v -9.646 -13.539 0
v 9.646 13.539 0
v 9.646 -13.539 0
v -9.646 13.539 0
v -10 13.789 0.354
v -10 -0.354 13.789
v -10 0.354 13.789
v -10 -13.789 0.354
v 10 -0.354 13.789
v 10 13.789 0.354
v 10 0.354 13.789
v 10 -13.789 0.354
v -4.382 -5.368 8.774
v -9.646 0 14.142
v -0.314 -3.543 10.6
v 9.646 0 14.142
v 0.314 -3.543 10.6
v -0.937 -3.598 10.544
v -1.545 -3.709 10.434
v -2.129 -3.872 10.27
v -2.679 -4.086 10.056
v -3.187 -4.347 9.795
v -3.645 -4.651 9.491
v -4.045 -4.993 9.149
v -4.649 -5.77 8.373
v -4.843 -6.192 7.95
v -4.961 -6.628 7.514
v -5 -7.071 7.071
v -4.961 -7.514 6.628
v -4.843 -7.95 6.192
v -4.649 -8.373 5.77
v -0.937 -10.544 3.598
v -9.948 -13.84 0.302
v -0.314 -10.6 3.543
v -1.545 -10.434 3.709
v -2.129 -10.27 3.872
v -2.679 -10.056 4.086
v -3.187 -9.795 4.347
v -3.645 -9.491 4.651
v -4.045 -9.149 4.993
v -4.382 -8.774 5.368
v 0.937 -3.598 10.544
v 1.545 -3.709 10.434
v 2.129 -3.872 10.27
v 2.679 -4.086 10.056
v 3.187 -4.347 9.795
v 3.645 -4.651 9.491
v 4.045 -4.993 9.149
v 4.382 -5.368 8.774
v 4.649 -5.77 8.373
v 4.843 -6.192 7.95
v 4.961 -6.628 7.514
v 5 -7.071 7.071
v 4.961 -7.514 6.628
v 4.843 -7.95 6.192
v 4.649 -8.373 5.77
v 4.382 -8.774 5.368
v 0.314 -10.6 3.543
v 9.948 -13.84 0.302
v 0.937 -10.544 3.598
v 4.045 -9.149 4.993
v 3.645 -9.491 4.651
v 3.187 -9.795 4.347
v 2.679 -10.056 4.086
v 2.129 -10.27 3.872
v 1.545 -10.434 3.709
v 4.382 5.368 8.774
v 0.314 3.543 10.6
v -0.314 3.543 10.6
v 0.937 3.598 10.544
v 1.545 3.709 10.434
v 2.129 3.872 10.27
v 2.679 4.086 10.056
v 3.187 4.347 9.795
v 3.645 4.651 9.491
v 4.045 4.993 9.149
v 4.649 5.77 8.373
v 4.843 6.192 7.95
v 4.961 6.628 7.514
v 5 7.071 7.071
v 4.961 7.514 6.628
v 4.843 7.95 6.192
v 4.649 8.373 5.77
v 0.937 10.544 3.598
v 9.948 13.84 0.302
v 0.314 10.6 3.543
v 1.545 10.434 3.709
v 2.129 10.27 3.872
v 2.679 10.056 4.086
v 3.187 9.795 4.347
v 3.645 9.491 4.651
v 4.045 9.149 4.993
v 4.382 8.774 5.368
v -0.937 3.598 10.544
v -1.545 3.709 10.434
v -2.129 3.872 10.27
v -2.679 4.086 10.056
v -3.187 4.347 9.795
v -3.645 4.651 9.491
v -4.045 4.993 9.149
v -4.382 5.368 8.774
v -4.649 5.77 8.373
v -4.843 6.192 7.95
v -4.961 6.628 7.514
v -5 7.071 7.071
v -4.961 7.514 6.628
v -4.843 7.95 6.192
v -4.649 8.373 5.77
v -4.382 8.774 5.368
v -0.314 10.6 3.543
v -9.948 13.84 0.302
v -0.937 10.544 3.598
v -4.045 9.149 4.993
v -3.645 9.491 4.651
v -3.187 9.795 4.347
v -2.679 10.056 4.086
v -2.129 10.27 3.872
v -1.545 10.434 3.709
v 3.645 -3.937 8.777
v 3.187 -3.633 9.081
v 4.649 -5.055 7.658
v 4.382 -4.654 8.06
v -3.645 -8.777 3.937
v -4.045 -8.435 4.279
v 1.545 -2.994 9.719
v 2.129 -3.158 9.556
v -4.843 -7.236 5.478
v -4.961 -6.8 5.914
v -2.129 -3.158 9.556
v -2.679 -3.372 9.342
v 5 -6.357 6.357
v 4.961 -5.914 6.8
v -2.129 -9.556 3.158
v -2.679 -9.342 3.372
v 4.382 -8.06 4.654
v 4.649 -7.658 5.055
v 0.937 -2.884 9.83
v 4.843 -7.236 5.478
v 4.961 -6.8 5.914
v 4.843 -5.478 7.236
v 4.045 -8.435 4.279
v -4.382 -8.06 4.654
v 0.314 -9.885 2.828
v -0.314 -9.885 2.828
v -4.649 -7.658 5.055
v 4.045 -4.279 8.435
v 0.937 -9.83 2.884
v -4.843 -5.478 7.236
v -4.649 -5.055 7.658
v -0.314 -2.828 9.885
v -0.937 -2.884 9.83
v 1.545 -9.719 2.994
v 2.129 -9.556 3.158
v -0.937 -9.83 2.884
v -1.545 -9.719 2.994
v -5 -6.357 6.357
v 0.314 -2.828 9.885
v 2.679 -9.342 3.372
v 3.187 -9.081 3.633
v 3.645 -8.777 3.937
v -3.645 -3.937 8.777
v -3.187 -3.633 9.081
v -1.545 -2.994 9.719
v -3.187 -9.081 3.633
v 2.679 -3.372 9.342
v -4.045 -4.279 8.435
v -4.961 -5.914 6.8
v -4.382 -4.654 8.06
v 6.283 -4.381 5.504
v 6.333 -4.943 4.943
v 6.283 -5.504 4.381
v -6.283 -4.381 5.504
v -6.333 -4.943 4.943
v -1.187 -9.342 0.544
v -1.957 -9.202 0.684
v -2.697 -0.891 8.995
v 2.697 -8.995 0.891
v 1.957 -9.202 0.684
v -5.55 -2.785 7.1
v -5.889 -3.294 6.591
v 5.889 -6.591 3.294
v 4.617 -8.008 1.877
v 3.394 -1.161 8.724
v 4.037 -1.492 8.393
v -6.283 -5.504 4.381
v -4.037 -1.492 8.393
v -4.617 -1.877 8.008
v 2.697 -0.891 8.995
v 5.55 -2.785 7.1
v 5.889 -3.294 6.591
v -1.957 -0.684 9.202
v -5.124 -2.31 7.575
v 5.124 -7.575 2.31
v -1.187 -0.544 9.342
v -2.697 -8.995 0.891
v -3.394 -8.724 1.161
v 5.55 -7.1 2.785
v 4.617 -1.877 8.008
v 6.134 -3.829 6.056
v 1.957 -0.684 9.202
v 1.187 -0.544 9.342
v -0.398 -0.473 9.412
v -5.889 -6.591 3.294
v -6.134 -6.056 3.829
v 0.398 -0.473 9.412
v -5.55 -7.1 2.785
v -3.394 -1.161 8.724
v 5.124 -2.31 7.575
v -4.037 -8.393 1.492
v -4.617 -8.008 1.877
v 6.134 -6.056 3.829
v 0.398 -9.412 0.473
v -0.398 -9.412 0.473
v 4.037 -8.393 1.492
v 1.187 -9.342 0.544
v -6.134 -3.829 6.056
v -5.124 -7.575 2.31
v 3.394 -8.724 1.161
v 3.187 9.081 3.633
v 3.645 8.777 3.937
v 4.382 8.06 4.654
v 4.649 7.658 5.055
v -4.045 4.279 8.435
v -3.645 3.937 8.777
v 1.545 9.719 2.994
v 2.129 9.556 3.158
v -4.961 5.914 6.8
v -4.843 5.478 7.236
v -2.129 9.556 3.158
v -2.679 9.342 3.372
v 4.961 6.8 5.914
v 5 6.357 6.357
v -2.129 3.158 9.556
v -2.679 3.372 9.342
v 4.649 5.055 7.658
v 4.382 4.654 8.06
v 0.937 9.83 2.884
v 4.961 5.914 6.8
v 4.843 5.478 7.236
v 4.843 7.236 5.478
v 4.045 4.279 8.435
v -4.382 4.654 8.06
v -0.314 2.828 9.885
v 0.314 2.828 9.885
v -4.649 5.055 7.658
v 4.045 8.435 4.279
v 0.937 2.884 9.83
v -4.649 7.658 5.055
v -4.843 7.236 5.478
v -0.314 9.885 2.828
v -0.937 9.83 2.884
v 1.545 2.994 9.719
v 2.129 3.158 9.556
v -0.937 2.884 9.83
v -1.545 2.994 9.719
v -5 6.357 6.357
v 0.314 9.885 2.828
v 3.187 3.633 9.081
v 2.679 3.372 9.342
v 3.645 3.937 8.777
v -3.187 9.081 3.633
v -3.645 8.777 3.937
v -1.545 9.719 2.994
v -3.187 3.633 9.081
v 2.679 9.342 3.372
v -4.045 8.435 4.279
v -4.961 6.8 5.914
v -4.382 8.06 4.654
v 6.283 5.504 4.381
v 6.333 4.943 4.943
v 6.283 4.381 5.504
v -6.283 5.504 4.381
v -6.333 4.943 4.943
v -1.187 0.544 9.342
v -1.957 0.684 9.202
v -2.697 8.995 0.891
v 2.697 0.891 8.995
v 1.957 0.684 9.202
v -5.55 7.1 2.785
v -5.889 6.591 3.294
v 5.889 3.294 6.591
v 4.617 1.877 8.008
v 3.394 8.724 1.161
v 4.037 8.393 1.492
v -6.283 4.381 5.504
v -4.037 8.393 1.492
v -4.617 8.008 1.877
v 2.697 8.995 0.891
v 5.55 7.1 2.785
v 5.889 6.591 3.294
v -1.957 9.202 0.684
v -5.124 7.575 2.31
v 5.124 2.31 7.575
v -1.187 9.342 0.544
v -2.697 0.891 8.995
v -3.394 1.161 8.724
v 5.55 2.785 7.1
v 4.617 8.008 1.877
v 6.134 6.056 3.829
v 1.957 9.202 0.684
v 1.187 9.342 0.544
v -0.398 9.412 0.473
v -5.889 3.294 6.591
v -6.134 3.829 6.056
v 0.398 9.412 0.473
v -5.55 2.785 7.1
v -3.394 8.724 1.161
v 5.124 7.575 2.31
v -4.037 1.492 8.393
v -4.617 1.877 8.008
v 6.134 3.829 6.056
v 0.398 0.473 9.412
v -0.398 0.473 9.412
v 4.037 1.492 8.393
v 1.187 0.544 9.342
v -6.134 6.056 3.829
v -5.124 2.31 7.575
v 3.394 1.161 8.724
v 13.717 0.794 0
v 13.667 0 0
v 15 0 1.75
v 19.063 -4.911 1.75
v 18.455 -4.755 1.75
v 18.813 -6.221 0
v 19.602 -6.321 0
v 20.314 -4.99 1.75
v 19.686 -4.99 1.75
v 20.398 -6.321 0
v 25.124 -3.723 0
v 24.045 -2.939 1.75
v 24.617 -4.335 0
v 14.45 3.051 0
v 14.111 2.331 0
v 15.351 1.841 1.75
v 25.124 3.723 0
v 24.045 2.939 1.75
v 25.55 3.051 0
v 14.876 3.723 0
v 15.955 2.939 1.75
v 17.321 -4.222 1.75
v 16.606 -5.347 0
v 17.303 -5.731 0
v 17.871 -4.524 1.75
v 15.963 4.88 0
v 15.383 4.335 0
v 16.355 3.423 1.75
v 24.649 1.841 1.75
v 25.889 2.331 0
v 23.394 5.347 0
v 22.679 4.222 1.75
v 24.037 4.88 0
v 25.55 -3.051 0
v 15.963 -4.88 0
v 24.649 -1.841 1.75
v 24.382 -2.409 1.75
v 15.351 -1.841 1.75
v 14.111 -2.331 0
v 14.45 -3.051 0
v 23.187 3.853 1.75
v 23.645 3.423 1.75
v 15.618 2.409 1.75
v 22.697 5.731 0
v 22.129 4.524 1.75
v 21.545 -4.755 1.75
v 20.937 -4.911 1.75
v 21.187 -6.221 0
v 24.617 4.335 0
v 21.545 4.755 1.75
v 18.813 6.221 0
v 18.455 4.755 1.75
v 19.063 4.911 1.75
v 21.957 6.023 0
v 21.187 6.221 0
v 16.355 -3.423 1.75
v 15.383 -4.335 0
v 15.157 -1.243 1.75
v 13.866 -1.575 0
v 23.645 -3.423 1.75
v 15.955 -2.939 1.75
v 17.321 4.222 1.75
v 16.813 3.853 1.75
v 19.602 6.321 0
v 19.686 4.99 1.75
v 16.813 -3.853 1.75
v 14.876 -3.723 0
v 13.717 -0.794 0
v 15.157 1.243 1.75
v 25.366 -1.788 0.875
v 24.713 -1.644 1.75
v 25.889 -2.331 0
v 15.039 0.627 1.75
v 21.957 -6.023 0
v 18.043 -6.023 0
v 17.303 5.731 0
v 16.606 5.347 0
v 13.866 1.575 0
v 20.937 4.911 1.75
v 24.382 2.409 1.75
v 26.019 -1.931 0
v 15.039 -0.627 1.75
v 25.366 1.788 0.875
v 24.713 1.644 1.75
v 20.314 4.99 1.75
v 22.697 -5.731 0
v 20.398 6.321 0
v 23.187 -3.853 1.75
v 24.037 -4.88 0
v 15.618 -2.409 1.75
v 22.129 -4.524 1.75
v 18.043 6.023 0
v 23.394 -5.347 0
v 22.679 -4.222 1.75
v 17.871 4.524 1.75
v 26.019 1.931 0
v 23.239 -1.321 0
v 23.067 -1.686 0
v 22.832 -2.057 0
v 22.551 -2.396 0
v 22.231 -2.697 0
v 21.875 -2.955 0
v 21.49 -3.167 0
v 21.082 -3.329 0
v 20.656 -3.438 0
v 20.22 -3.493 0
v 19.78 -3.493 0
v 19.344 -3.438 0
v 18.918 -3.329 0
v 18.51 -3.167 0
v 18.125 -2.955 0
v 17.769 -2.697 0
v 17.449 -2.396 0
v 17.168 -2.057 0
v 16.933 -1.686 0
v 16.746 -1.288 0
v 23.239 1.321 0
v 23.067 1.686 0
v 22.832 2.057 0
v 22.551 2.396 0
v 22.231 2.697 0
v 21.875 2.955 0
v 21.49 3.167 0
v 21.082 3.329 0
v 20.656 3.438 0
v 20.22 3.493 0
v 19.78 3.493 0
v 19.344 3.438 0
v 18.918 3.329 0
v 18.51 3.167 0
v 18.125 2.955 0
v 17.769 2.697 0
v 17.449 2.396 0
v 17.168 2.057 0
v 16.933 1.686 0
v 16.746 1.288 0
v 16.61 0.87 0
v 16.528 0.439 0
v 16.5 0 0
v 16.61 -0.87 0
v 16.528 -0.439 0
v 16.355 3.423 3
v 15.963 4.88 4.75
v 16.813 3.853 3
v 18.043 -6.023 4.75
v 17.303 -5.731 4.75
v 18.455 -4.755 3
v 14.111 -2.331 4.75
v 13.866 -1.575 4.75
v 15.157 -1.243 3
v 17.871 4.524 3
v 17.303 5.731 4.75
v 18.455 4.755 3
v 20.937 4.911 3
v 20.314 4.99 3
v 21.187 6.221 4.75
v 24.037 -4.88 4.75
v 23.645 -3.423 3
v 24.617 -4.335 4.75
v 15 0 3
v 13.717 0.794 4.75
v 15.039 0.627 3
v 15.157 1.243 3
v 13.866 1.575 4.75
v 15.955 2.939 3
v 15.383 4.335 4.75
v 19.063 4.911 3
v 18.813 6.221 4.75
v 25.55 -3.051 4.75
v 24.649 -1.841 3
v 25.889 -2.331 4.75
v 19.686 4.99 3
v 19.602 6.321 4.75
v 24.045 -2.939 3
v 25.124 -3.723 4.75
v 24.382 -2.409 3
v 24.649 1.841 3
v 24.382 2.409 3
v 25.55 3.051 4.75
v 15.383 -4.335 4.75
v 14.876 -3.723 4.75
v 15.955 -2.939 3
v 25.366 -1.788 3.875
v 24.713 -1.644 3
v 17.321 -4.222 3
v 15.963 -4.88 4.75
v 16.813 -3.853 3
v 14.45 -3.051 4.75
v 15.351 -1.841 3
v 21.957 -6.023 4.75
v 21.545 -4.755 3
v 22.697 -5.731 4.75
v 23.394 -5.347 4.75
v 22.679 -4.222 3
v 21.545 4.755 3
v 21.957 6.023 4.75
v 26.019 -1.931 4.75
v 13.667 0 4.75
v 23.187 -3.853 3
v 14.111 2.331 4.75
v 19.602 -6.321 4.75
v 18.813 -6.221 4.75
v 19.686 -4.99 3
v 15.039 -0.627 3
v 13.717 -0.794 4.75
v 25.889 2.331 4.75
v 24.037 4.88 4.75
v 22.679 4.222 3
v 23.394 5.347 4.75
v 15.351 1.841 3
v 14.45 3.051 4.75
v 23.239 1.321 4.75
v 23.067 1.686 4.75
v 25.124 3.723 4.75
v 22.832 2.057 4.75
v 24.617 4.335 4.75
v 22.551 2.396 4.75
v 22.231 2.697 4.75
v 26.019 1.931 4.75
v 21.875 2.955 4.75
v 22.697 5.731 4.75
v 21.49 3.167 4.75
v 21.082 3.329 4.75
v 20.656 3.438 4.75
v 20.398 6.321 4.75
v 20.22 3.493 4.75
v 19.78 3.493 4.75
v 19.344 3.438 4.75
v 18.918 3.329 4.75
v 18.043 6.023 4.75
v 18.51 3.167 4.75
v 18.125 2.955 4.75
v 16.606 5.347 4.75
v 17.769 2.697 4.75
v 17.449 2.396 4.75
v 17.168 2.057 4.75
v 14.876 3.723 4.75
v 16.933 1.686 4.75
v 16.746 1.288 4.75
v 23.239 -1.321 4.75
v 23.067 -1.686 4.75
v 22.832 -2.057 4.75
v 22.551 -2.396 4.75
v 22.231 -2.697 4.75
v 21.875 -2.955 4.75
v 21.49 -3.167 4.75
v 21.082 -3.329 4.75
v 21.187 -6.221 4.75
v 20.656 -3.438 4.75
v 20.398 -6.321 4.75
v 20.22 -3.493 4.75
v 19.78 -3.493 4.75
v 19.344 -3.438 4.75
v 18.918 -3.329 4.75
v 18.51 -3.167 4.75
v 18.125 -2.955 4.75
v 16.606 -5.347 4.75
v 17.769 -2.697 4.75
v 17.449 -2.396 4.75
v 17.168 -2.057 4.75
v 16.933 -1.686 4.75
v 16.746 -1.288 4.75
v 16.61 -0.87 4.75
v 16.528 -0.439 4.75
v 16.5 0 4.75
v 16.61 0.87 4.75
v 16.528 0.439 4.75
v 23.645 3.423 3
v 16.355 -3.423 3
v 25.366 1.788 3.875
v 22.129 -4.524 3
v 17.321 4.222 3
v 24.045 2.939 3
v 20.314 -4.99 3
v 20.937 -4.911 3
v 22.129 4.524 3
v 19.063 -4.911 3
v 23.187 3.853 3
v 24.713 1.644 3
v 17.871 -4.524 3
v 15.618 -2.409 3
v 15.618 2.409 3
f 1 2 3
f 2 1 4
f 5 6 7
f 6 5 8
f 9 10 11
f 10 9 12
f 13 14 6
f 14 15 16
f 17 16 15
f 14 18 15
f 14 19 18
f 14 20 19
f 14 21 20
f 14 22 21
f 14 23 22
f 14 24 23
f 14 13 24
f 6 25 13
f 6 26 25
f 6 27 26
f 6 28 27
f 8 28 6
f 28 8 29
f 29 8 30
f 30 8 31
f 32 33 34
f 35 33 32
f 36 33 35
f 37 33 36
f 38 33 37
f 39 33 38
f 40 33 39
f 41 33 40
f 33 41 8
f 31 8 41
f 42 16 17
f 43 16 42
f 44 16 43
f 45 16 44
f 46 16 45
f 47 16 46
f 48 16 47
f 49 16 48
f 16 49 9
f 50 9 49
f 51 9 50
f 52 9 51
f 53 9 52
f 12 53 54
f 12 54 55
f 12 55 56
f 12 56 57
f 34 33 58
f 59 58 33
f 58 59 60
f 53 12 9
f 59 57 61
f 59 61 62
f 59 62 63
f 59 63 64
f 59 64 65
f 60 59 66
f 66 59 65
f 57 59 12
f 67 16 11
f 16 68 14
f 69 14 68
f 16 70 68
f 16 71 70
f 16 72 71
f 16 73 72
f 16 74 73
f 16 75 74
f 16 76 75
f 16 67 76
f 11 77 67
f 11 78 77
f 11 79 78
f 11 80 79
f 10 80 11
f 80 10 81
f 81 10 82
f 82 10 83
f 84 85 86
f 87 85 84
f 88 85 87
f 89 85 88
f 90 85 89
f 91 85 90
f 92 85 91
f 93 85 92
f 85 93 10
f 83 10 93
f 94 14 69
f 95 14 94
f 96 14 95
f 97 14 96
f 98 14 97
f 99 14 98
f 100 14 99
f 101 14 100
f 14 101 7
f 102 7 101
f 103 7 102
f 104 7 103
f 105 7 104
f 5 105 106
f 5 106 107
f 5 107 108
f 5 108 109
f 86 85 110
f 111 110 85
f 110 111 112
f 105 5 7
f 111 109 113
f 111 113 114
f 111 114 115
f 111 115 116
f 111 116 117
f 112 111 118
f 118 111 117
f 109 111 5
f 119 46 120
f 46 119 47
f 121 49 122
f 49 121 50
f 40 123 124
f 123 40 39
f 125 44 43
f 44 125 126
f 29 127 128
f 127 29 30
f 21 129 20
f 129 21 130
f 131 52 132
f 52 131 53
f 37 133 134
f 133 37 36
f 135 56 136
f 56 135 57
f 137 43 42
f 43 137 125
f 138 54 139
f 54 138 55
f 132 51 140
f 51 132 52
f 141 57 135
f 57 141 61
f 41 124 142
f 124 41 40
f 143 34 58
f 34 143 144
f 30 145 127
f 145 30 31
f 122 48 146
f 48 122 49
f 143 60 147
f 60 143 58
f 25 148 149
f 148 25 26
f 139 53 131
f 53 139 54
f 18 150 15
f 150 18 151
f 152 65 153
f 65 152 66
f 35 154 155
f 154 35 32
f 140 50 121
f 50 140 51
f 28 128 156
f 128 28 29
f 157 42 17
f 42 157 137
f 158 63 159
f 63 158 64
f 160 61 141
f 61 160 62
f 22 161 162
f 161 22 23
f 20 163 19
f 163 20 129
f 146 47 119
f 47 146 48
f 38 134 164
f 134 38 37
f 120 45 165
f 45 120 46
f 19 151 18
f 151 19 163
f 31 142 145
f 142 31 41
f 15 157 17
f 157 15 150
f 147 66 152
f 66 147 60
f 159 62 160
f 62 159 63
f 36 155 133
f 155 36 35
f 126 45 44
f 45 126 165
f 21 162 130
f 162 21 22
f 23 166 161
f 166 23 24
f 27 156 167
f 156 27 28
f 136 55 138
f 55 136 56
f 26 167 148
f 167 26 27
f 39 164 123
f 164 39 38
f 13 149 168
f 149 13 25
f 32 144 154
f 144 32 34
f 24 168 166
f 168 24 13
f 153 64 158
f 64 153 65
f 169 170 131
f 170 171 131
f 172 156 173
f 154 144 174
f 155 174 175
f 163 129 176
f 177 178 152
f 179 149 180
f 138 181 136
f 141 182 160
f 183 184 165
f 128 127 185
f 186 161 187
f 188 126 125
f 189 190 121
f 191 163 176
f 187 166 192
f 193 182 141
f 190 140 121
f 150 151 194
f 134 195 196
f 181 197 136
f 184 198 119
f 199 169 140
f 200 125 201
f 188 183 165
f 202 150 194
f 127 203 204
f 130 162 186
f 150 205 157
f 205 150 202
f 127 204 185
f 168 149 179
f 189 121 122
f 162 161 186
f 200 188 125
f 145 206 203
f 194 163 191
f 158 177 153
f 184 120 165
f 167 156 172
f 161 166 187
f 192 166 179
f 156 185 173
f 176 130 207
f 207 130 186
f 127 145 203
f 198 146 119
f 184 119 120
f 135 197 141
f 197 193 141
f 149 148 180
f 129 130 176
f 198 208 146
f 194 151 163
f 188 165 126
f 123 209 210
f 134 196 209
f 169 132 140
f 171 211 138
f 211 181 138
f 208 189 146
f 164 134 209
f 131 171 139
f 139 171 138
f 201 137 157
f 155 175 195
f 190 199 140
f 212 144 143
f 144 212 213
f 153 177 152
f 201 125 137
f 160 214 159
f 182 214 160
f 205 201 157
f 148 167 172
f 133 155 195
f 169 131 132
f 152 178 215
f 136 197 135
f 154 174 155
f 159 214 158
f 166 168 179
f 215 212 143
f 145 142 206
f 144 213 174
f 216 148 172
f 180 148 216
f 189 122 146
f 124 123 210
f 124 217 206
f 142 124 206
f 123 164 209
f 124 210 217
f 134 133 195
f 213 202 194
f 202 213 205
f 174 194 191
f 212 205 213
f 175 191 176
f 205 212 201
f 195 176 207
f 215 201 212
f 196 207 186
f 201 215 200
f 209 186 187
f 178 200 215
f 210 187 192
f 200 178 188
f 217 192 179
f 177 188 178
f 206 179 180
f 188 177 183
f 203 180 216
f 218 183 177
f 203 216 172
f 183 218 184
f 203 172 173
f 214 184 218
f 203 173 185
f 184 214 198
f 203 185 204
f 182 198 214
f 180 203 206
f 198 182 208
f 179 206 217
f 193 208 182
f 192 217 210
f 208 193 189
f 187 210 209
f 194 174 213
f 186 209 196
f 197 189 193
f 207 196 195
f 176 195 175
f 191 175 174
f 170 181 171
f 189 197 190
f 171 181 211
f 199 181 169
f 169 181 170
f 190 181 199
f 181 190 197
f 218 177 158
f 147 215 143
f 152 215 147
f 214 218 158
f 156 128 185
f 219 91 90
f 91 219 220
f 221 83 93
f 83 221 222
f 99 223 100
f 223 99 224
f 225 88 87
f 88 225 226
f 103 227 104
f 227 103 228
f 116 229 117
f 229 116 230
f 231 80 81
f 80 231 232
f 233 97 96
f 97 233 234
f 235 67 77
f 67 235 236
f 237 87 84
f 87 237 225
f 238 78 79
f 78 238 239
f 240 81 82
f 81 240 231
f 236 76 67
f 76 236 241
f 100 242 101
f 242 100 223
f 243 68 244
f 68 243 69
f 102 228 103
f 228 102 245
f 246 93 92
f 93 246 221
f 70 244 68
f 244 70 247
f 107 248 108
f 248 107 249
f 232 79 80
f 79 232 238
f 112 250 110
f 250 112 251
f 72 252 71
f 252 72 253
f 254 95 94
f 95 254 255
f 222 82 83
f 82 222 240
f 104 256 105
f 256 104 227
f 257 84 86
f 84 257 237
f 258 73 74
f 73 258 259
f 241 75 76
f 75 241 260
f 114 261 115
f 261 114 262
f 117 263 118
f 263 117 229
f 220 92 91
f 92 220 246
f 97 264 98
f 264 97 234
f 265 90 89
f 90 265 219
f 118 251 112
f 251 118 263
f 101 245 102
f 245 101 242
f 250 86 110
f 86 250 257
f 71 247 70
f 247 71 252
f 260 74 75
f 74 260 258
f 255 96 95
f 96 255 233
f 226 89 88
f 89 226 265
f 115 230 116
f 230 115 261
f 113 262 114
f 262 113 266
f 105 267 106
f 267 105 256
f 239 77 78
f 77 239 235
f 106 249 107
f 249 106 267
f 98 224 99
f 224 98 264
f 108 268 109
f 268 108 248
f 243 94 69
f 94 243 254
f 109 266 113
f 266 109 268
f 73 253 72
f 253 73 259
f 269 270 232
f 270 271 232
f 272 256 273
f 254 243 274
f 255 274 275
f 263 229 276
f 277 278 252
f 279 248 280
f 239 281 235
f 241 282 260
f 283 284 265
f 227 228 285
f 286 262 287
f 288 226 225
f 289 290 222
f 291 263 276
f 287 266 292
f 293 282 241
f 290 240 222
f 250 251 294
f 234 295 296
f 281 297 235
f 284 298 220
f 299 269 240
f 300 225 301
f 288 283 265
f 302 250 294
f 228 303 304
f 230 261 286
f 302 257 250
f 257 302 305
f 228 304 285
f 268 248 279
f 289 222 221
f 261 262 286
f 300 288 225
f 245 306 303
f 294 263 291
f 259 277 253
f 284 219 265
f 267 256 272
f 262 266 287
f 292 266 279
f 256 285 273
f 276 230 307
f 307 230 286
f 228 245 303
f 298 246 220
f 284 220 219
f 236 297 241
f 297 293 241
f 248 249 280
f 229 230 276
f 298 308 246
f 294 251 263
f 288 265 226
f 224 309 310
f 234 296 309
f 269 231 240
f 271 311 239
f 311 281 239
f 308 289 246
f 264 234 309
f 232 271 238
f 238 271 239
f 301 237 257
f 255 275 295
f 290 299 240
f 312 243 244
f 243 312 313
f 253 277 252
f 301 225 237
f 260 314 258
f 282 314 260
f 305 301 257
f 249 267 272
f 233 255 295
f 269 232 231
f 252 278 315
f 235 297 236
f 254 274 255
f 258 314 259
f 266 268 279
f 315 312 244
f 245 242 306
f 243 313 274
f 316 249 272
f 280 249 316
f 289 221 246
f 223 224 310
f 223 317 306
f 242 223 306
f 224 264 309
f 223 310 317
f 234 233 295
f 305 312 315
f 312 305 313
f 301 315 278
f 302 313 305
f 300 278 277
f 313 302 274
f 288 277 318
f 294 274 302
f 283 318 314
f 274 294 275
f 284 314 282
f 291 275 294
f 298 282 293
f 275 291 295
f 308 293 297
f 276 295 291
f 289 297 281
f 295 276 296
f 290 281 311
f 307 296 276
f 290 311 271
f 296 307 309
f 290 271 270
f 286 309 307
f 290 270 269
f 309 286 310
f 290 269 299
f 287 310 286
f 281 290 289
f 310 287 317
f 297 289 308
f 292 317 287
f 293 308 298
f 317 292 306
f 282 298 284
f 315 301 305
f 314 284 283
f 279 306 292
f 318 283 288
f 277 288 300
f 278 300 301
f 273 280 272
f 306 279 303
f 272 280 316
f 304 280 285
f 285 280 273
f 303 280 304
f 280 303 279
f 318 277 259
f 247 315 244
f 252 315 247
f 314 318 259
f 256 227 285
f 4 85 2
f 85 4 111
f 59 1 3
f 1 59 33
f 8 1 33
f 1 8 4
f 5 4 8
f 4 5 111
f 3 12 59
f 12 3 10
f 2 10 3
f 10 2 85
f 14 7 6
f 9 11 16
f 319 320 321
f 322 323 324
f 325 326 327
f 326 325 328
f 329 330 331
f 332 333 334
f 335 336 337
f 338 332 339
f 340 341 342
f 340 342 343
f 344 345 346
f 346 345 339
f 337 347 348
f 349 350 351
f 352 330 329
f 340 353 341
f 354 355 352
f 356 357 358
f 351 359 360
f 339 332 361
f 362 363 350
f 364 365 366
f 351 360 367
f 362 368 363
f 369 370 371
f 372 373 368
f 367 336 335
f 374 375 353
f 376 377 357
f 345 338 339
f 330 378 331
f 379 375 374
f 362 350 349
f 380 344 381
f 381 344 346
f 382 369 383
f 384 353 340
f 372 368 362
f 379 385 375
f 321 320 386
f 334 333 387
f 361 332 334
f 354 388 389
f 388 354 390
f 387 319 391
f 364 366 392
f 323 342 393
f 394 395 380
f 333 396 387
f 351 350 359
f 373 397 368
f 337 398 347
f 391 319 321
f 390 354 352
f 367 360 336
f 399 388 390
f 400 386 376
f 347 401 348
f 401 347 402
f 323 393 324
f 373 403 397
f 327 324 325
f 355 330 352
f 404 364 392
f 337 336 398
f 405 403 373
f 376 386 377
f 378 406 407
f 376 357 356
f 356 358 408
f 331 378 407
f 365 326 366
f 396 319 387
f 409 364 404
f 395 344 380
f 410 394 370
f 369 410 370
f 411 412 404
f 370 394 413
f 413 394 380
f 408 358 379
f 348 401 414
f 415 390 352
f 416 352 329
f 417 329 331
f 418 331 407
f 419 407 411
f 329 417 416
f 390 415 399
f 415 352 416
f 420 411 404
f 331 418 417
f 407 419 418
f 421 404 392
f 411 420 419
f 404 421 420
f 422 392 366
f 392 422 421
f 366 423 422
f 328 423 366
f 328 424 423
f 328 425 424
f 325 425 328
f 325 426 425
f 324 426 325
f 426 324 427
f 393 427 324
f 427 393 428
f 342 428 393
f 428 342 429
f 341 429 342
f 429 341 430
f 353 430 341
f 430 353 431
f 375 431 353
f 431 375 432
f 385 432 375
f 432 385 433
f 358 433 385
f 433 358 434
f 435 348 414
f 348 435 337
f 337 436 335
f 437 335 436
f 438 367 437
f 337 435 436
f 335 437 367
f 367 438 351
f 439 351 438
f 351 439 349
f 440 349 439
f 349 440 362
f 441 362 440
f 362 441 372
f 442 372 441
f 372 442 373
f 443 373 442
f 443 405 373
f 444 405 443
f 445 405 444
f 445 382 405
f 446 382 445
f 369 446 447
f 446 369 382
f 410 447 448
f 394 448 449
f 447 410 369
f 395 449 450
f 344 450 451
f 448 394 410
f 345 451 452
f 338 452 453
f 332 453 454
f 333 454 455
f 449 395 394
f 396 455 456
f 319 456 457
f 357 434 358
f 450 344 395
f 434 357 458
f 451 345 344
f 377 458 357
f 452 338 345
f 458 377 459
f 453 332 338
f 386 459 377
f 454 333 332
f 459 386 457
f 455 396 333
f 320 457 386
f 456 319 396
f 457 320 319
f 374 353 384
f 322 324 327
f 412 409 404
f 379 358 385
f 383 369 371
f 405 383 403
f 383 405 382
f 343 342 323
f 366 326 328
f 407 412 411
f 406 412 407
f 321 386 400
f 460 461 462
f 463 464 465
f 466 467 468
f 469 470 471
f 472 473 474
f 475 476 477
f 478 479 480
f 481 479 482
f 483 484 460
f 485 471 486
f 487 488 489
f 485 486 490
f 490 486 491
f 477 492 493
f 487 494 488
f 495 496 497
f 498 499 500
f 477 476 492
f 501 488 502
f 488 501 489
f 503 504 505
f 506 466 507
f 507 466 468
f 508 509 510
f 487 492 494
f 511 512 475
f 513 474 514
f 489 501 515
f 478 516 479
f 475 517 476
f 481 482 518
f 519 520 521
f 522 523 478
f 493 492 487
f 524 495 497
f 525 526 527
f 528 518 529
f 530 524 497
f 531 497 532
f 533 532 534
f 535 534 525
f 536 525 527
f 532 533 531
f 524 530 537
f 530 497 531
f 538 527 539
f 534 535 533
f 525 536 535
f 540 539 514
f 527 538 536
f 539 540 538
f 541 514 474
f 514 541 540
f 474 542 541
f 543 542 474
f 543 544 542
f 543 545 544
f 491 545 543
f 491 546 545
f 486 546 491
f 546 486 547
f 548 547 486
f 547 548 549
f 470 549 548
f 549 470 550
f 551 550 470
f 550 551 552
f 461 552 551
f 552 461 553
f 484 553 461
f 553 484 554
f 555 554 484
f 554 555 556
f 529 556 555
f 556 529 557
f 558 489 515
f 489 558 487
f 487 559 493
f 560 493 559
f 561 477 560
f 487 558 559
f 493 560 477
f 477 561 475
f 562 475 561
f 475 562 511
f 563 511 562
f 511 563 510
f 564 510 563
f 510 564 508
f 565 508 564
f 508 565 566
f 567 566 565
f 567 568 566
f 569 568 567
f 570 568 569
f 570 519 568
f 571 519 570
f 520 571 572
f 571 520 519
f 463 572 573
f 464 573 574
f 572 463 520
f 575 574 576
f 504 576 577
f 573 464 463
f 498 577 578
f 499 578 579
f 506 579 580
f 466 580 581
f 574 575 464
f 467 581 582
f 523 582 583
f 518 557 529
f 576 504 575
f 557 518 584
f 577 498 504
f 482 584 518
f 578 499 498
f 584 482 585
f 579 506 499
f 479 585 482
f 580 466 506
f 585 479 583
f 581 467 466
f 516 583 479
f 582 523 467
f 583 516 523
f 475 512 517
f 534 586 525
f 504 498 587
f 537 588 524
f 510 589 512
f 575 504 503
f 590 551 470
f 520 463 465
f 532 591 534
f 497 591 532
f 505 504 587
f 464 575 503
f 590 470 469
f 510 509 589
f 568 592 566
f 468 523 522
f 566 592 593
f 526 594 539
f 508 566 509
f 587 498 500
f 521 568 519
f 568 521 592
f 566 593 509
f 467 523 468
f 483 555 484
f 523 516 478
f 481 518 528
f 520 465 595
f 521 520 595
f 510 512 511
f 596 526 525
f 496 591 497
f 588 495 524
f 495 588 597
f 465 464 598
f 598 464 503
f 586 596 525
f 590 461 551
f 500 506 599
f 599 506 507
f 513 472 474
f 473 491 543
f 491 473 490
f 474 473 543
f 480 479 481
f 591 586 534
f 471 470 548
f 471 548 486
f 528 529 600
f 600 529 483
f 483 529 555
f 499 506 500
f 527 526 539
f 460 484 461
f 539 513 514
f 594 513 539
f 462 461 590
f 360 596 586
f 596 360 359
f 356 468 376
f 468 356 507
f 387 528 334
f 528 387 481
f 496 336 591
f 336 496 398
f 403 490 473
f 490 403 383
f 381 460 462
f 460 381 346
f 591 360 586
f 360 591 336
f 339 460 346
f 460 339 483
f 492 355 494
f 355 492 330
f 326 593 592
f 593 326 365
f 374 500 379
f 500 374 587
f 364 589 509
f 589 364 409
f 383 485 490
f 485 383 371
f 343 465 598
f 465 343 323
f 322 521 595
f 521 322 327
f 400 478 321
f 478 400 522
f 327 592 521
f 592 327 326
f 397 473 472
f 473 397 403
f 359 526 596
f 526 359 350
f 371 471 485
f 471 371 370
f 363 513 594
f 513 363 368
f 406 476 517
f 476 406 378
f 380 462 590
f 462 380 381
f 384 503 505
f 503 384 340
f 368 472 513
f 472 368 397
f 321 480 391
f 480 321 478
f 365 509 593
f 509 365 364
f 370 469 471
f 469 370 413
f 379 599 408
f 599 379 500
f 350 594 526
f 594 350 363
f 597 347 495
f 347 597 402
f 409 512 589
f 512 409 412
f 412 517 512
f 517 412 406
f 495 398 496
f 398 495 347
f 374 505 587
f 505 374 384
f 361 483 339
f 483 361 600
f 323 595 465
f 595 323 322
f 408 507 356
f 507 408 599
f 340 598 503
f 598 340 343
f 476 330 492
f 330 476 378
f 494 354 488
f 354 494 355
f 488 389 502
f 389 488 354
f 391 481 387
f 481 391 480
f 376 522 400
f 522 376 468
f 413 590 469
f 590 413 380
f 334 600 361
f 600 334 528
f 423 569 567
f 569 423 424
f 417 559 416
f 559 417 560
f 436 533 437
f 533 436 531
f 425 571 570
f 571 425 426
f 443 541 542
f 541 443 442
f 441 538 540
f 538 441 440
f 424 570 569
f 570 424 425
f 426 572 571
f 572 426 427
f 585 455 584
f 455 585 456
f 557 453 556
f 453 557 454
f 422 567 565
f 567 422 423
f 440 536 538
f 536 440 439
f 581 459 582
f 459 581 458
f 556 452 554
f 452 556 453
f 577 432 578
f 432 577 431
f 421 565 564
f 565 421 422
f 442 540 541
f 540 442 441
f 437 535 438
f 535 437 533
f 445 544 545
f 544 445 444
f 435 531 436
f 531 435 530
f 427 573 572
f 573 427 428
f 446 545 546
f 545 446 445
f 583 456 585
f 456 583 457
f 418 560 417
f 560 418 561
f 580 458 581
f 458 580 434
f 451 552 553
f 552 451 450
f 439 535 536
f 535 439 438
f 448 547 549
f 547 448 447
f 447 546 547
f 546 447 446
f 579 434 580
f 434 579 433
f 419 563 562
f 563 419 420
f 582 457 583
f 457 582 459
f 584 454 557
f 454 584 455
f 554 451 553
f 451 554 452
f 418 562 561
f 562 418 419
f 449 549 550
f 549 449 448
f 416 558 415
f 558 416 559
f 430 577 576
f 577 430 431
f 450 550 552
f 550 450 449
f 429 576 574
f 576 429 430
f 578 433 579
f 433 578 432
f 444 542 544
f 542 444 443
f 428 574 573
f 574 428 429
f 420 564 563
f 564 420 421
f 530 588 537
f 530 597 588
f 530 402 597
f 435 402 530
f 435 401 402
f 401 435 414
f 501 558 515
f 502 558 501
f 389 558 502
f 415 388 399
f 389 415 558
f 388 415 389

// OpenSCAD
// Snake Puzzle
// Written by Marius Gheorghescu (@mgx3d)

// edge length in mm (15 .. 150mm)
size = 20;

/* [Hidden] */

// depth of the coupler (1.0 .. 3.0mm)
coupler_depth = min(5, size/10);
clip_ring_depth = coupler_depth/1.5;
connector_dia = size*0.95 - 6*clip_ring_depth - 1.0;

clearance = 0.25;
epsilon = 0.01;

$fn = 50;

debug = 0;



module prism(size)
{
    intersection() {
        translate([0,0, size])
            cube([size*2, size*2, size*2], center=true);
        
        rotate([45, 0, 0])
            cube([size, size, size], center=true);
    }
}


module piece()
{
    chamfer = 0.5;
    difference()
    {
        prism(size);

        if (0) {
            // save material ?
            translate([0,0,coupler_depth/2*0])
                difference() {
                    prism(size-2*coupler_depth);
                    cube([2*size, 2*size, 2*coupler_depth], center=true);
                }
        }
        
        
        rotate([45,0,0])
        translate([0,0,size - coupler_depth - epsilon]) {
            cylinder(r=connector_dia/2, h=size, center=true);
            translate([0,0, - size/2 + 0*coupler_depth/2])
                cylinder(r1=connector_dia/2 + clip_ring_depth, r2=connector_dia/2, h=coupler_depth, center=true);
        }

        rotate([-45,0,0])
        translate([0,0,size - coupler_depth - epsilon]) {
            cylinder(r=connector_dia/2, h=size, center=true);
            translate([0,0, - size/2 + 0*coupler_depth/2])
                cylinder(r1=connector_dia/2 + clip_ring_depth, r2=connector_dia/2, h=coupler_depth, center=true);            
        }
        
        //
        // chamfers
        //
        
        translate([0, size*sqrt(2)/2 - chamfer/2, 0])
        rotate([45,0,0])
            cube([2*size, chamfer, chamfer], center=true);

        translate([0, -size*sqrt(2)/2 + chamfer/2, 0])
        rotate([45,0,0])
            cube([2*size, chamfer, chamfer], center=true);

        translate([-size/2,0,0])
        rotate([45,0,90])
            cube([2*size, chamfer, chamfer], center=true);

        translate([size/2,0,0])
        rotate([45,0,90])
            cube([2*size, chamfer, chamfer], center=true);

        translate([-size/2,0,size*sqrt(2)/2])
        rotate([45,0,90])
            cube([2*size, chamfer, chamfer], center=true);

        translate([size/2,0,size*sqrt(2)/2])
        rotate([45,0,90])
            cube([2*size, chamfer, chamfer], center=true);

        if (debug)
            translate([0,0,-epsilon])
            cube([size,size,size]);
    }
}


module coupler()
{    
    wall_thickness = size/10;
    
    translate([0,0,coupler_depth*1.25 - clearance/2])
    difference() {
        union() {
            translate([0,0,-coupler_depth*0.75])
            cylinder(r1=connector_dia/2 + clip_ring_depth, r2=connector_dia/2, h=coupler_depth - clearance, center=true);
            
            translate([0,0,coupler_depth*0.75])
                cylinder(r2=connector_dia/2 + clip_ring_depth, r1=connector_dia/2, h=coupler_depth - clearance, center=true);
                        
            cylinder(r=connector_dia/2, h=2*coupler_depth, center=true);
        }
        
        // empty inside
        cylinder(r=connector_dia/2 - size/8 + 1, h=3*coupler_depth, center=true);

        // cut-out for ring compression 
        hull() {
            translate([connector_dia/2 + coupler_depth,0,])
                cube([clip_ring_depth, size/5, 3*coupler_depth], center=true);
            cube([1, 1, 3*coupler_depth], center=true);
        }
    }
}


if (debug) {    
    // show coupler inside
    %rotate([-45,0,0])
    translate([0,0,size/2 - coupler_depth - clearance]) 
        color([0.9, 0.1, 0.1, 0.2]) coupler();
}

piece();
translate([size, 0, 0]) coupler();
